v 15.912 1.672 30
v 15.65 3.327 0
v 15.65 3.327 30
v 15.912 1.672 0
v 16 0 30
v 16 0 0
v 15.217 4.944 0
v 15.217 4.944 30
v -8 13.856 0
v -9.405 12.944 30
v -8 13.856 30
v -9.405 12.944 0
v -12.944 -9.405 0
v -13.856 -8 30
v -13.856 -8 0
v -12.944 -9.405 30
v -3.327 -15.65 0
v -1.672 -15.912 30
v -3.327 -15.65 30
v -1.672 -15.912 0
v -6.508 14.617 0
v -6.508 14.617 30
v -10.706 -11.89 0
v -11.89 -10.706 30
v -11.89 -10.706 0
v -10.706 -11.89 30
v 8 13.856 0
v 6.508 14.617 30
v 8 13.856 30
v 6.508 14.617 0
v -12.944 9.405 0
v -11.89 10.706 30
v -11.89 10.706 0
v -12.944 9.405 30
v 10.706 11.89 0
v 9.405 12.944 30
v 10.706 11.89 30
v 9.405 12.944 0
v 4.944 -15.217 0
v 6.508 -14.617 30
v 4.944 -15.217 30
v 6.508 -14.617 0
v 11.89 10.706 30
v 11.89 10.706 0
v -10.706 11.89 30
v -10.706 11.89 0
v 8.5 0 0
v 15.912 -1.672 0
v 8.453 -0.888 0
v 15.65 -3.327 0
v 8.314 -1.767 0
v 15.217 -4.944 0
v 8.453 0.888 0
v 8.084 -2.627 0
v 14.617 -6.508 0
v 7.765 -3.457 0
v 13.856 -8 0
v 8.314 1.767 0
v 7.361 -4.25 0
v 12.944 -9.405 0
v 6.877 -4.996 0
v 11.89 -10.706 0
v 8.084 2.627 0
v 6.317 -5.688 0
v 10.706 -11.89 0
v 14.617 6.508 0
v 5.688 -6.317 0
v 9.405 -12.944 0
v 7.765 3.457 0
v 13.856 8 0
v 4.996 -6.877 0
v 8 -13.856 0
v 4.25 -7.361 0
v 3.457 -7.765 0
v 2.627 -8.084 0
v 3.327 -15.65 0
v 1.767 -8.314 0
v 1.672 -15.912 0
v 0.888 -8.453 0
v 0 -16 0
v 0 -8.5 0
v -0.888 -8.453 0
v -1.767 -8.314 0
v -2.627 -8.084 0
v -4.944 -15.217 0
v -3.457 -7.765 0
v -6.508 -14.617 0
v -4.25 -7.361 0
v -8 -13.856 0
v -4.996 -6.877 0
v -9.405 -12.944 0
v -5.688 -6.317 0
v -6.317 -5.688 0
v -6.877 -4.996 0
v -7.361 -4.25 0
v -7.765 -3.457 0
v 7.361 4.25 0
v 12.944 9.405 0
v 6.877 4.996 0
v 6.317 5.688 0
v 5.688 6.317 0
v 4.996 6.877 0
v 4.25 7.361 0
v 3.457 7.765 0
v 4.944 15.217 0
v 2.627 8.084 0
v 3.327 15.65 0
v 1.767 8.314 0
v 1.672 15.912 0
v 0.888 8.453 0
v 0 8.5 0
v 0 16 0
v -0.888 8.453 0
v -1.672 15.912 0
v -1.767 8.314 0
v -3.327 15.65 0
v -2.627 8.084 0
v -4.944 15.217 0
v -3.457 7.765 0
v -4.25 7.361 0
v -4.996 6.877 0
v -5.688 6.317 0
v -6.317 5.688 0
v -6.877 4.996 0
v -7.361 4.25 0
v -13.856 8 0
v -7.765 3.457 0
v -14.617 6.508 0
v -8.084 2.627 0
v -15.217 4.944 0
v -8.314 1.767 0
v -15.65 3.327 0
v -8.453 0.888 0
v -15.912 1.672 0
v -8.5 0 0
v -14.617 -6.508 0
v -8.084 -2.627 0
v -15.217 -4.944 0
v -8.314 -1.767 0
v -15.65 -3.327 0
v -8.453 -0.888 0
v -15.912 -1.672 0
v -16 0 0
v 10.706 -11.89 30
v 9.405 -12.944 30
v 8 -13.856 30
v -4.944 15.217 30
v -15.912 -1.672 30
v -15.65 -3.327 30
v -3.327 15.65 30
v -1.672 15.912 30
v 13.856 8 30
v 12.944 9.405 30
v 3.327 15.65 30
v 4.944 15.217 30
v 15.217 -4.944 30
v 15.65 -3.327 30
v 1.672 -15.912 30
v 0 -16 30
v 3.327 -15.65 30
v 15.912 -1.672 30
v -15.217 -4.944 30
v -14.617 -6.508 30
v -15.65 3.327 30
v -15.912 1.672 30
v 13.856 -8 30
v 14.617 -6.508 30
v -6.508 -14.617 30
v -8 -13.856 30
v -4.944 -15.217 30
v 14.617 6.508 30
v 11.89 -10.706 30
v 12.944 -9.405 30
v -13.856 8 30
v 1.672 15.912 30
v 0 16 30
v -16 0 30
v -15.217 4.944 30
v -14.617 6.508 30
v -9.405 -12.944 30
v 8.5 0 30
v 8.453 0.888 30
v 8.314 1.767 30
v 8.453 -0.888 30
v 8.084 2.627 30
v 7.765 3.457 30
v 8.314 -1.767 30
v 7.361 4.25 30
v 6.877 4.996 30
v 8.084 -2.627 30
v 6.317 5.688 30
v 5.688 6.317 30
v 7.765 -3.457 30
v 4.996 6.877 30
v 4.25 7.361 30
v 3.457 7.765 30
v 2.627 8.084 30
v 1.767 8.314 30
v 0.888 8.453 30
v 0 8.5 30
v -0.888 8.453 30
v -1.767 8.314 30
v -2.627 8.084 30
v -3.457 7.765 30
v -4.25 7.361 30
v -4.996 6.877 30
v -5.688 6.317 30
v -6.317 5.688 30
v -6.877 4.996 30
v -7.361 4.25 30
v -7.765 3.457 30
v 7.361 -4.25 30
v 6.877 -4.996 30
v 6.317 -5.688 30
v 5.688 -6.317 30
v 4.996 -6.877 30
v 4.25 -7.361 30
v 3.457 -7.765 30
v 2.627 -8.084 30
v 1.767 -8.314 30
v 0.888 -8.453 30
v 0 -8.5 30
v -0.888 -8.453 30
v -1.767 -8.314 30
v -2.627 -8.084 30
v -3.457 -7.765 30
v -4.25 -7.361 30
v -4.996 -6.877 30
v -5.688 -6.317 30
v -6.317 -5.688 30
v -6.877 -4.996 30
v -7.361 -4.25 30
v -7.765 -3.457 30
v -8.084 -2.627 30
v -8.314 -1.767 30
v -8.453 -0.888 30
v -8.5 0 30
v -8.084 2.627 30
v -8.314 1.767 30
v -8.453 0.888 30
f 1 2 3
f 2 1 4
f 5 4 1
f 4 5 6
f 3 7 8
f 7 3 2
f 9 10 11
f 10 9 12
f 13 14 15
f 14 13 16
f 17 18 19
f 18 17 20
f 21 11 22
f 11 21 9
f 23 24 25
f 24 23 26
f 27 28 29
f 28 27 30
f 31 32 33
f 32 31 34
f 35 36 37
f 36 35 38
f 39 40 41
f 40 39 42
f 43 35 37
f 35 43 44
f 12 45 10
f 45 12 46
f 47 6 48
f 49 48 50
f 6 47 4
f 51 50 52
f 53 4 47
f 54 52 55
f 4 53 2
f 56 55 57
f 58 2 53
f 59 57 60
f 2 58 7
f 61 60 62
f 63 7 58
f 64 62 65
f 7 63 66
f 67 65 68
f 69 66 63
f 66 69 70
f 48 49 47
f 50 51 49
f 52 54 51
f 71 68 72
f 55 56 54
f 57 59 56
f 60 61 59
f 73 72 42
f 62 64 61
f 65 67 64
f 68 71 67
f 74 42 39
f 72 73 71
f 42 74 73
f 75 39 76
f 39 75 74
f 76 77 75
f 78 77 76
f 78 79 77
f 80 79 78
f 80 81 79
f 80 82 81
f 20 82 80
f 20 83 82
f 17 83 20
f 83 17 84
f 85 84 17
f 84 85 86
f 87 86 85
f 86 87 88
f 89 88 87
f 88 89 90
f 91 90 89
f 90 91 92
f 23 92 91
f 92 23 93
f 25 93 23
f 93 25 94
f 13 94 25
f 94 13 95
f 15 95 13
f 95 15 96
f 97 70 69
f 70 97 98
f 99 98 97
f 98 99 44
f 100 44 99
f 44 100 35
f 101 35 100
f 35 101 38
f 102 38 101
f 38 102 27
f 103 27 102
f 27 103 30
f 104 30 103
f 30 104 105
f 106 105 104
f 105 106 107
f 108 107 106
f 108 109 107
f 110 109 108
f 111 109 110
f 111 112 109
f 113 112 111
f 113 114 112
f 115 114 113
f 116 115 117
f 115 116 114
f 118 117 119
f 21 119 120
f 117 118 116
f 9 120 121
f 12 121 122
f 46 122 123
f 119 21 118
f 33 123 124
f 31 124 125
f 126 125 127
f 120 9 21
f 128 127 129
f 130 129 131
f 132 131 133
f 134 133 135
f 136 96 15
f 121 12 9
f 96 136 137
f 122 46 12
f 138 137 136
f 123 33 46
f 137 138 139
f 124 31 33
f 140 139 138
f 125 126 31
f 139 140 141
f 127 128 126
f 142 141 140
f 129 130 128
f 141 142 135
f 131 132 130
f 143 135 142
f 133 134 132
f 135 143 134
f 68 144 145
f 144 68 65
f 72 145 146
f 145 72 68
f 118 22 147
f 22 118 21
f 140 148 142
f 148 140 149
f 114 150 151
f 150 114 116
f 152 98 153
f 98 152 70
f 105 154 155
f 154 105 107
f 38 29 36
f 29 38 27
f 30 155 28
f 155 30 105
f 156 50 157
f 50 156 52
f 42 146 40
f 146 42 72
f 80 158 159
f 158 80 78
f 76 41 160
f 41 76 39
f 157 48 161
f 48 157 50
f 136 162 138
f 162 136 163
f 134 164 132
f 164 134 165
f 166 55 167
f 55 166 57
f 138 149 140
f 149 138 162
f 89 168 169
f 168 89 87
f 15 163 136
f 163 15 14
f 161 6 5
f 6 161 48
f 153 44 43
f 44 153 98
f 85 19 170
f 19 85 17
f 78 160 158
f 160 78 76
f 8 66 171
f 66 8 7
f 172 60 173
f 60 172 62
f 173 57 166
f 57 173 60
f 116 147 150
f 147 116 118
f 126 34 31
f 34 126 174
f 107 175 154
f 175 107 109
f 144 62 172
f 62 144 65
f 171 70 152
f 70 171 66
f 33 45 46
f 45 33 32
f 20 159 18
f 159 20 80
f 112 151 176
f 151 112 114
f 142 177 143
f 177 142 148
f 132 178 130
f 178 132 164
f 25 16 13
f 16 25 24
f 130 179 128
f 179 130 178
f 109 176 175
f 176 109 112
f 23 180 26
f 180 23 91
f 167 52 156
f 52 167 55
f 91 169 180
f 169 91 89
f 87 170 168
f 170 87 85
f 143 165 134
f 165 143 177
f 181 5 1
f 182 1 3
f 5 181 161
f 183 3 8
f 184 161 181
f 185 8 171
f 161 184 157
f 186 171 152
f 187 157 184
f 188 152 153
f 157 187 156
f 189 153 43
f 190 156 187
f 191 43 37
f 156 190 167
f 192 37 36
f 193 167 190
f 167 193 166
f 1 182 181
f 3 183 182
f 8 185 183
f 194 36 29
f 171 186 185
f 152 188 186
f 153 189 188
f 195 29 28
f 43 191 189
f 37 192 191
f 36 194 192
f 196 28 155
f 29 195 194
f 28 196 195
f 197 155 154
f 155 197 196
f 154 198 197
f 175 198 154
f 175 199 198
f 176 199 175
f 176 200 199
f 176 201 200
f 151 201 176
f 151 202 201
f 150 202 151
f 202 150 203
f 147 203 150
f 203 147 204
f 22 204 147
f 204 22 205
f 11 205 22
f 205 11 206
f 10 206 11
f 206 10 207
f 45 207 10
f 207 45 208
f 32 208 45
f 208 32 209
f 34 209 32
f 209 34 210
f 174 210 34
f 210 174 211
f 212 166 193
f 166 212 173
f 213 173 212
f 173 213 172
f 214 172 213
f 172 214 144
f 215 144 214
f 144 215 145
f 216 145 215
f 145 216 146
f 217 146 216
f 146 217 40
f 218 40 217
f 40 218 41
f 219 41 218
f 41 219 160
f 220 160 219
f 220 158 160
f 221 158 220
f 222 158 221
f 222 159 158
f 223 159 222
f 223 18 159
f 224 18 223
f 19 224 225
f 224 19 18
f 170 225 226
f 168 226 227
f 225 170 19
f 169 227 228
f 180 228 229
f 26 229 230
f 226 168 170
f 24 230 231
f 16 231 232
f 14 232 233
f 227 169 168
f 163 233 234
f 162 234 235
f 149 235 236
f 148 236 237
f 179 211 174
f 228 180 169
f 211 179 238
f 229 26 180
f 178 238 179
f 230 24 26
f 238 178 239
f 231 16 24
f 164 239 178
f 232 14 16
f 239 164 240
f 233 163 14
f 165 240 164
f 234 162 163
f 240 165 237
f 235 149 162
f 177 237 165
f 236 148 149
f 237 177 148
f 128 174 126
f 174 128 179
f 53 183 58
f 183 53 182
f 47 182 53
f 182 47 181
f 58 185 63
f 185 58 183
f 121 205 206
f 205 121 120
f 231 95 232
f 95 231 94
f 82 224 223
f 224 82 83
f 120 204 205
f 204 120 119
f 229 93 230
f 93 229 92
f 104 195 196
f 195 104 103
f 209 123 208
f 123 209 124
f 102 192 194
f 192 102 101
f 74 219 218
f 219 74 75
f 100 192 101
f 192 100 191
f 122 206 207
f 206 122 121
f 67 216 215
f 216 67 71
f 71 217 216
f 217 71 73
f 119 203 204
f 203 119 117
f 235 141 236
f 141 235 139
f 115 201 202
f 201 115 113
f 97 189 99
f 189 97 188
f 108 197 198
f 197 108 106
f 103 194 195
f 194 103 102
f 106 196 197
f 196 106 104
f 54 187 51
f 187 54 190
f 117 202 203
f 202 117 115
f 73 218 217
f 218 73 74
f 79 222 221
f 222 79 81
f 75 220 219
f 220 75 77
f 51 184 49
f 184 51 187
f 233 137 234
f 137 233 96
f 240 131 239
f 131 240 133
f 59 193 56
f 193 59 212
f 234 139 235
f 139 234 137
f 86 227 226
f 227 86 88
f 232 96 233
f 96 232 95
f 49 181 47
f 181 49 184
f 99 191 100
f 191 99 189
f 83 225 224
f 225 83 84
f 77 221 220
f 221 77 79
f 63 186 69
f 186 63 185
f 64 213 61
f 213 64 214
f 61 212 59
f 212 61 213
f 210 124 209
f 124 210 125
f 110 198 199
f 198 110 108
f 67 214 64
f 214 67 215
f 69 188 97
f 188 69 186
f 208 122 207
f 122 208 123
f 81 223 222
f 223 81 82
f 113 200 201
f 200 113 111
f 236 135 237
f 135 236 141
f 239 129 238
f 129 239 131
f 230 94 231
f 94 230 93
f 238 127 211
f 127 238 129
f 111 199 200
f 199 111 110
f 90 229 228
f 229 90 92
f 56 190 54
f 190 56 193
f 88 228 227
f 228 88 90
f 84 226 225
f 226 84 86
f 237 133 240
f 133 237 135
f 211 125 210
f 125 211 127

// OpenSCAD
// Round spacer.
$fn = 60;
eps = 0.02;
inner_d = 17;
outer_d = 32;
length = 30;
difference() { cylinder(d=outer_d,h=length); translate([0,0,-eps]) cylinder(d=inner_d,h=length+2*eps); }
